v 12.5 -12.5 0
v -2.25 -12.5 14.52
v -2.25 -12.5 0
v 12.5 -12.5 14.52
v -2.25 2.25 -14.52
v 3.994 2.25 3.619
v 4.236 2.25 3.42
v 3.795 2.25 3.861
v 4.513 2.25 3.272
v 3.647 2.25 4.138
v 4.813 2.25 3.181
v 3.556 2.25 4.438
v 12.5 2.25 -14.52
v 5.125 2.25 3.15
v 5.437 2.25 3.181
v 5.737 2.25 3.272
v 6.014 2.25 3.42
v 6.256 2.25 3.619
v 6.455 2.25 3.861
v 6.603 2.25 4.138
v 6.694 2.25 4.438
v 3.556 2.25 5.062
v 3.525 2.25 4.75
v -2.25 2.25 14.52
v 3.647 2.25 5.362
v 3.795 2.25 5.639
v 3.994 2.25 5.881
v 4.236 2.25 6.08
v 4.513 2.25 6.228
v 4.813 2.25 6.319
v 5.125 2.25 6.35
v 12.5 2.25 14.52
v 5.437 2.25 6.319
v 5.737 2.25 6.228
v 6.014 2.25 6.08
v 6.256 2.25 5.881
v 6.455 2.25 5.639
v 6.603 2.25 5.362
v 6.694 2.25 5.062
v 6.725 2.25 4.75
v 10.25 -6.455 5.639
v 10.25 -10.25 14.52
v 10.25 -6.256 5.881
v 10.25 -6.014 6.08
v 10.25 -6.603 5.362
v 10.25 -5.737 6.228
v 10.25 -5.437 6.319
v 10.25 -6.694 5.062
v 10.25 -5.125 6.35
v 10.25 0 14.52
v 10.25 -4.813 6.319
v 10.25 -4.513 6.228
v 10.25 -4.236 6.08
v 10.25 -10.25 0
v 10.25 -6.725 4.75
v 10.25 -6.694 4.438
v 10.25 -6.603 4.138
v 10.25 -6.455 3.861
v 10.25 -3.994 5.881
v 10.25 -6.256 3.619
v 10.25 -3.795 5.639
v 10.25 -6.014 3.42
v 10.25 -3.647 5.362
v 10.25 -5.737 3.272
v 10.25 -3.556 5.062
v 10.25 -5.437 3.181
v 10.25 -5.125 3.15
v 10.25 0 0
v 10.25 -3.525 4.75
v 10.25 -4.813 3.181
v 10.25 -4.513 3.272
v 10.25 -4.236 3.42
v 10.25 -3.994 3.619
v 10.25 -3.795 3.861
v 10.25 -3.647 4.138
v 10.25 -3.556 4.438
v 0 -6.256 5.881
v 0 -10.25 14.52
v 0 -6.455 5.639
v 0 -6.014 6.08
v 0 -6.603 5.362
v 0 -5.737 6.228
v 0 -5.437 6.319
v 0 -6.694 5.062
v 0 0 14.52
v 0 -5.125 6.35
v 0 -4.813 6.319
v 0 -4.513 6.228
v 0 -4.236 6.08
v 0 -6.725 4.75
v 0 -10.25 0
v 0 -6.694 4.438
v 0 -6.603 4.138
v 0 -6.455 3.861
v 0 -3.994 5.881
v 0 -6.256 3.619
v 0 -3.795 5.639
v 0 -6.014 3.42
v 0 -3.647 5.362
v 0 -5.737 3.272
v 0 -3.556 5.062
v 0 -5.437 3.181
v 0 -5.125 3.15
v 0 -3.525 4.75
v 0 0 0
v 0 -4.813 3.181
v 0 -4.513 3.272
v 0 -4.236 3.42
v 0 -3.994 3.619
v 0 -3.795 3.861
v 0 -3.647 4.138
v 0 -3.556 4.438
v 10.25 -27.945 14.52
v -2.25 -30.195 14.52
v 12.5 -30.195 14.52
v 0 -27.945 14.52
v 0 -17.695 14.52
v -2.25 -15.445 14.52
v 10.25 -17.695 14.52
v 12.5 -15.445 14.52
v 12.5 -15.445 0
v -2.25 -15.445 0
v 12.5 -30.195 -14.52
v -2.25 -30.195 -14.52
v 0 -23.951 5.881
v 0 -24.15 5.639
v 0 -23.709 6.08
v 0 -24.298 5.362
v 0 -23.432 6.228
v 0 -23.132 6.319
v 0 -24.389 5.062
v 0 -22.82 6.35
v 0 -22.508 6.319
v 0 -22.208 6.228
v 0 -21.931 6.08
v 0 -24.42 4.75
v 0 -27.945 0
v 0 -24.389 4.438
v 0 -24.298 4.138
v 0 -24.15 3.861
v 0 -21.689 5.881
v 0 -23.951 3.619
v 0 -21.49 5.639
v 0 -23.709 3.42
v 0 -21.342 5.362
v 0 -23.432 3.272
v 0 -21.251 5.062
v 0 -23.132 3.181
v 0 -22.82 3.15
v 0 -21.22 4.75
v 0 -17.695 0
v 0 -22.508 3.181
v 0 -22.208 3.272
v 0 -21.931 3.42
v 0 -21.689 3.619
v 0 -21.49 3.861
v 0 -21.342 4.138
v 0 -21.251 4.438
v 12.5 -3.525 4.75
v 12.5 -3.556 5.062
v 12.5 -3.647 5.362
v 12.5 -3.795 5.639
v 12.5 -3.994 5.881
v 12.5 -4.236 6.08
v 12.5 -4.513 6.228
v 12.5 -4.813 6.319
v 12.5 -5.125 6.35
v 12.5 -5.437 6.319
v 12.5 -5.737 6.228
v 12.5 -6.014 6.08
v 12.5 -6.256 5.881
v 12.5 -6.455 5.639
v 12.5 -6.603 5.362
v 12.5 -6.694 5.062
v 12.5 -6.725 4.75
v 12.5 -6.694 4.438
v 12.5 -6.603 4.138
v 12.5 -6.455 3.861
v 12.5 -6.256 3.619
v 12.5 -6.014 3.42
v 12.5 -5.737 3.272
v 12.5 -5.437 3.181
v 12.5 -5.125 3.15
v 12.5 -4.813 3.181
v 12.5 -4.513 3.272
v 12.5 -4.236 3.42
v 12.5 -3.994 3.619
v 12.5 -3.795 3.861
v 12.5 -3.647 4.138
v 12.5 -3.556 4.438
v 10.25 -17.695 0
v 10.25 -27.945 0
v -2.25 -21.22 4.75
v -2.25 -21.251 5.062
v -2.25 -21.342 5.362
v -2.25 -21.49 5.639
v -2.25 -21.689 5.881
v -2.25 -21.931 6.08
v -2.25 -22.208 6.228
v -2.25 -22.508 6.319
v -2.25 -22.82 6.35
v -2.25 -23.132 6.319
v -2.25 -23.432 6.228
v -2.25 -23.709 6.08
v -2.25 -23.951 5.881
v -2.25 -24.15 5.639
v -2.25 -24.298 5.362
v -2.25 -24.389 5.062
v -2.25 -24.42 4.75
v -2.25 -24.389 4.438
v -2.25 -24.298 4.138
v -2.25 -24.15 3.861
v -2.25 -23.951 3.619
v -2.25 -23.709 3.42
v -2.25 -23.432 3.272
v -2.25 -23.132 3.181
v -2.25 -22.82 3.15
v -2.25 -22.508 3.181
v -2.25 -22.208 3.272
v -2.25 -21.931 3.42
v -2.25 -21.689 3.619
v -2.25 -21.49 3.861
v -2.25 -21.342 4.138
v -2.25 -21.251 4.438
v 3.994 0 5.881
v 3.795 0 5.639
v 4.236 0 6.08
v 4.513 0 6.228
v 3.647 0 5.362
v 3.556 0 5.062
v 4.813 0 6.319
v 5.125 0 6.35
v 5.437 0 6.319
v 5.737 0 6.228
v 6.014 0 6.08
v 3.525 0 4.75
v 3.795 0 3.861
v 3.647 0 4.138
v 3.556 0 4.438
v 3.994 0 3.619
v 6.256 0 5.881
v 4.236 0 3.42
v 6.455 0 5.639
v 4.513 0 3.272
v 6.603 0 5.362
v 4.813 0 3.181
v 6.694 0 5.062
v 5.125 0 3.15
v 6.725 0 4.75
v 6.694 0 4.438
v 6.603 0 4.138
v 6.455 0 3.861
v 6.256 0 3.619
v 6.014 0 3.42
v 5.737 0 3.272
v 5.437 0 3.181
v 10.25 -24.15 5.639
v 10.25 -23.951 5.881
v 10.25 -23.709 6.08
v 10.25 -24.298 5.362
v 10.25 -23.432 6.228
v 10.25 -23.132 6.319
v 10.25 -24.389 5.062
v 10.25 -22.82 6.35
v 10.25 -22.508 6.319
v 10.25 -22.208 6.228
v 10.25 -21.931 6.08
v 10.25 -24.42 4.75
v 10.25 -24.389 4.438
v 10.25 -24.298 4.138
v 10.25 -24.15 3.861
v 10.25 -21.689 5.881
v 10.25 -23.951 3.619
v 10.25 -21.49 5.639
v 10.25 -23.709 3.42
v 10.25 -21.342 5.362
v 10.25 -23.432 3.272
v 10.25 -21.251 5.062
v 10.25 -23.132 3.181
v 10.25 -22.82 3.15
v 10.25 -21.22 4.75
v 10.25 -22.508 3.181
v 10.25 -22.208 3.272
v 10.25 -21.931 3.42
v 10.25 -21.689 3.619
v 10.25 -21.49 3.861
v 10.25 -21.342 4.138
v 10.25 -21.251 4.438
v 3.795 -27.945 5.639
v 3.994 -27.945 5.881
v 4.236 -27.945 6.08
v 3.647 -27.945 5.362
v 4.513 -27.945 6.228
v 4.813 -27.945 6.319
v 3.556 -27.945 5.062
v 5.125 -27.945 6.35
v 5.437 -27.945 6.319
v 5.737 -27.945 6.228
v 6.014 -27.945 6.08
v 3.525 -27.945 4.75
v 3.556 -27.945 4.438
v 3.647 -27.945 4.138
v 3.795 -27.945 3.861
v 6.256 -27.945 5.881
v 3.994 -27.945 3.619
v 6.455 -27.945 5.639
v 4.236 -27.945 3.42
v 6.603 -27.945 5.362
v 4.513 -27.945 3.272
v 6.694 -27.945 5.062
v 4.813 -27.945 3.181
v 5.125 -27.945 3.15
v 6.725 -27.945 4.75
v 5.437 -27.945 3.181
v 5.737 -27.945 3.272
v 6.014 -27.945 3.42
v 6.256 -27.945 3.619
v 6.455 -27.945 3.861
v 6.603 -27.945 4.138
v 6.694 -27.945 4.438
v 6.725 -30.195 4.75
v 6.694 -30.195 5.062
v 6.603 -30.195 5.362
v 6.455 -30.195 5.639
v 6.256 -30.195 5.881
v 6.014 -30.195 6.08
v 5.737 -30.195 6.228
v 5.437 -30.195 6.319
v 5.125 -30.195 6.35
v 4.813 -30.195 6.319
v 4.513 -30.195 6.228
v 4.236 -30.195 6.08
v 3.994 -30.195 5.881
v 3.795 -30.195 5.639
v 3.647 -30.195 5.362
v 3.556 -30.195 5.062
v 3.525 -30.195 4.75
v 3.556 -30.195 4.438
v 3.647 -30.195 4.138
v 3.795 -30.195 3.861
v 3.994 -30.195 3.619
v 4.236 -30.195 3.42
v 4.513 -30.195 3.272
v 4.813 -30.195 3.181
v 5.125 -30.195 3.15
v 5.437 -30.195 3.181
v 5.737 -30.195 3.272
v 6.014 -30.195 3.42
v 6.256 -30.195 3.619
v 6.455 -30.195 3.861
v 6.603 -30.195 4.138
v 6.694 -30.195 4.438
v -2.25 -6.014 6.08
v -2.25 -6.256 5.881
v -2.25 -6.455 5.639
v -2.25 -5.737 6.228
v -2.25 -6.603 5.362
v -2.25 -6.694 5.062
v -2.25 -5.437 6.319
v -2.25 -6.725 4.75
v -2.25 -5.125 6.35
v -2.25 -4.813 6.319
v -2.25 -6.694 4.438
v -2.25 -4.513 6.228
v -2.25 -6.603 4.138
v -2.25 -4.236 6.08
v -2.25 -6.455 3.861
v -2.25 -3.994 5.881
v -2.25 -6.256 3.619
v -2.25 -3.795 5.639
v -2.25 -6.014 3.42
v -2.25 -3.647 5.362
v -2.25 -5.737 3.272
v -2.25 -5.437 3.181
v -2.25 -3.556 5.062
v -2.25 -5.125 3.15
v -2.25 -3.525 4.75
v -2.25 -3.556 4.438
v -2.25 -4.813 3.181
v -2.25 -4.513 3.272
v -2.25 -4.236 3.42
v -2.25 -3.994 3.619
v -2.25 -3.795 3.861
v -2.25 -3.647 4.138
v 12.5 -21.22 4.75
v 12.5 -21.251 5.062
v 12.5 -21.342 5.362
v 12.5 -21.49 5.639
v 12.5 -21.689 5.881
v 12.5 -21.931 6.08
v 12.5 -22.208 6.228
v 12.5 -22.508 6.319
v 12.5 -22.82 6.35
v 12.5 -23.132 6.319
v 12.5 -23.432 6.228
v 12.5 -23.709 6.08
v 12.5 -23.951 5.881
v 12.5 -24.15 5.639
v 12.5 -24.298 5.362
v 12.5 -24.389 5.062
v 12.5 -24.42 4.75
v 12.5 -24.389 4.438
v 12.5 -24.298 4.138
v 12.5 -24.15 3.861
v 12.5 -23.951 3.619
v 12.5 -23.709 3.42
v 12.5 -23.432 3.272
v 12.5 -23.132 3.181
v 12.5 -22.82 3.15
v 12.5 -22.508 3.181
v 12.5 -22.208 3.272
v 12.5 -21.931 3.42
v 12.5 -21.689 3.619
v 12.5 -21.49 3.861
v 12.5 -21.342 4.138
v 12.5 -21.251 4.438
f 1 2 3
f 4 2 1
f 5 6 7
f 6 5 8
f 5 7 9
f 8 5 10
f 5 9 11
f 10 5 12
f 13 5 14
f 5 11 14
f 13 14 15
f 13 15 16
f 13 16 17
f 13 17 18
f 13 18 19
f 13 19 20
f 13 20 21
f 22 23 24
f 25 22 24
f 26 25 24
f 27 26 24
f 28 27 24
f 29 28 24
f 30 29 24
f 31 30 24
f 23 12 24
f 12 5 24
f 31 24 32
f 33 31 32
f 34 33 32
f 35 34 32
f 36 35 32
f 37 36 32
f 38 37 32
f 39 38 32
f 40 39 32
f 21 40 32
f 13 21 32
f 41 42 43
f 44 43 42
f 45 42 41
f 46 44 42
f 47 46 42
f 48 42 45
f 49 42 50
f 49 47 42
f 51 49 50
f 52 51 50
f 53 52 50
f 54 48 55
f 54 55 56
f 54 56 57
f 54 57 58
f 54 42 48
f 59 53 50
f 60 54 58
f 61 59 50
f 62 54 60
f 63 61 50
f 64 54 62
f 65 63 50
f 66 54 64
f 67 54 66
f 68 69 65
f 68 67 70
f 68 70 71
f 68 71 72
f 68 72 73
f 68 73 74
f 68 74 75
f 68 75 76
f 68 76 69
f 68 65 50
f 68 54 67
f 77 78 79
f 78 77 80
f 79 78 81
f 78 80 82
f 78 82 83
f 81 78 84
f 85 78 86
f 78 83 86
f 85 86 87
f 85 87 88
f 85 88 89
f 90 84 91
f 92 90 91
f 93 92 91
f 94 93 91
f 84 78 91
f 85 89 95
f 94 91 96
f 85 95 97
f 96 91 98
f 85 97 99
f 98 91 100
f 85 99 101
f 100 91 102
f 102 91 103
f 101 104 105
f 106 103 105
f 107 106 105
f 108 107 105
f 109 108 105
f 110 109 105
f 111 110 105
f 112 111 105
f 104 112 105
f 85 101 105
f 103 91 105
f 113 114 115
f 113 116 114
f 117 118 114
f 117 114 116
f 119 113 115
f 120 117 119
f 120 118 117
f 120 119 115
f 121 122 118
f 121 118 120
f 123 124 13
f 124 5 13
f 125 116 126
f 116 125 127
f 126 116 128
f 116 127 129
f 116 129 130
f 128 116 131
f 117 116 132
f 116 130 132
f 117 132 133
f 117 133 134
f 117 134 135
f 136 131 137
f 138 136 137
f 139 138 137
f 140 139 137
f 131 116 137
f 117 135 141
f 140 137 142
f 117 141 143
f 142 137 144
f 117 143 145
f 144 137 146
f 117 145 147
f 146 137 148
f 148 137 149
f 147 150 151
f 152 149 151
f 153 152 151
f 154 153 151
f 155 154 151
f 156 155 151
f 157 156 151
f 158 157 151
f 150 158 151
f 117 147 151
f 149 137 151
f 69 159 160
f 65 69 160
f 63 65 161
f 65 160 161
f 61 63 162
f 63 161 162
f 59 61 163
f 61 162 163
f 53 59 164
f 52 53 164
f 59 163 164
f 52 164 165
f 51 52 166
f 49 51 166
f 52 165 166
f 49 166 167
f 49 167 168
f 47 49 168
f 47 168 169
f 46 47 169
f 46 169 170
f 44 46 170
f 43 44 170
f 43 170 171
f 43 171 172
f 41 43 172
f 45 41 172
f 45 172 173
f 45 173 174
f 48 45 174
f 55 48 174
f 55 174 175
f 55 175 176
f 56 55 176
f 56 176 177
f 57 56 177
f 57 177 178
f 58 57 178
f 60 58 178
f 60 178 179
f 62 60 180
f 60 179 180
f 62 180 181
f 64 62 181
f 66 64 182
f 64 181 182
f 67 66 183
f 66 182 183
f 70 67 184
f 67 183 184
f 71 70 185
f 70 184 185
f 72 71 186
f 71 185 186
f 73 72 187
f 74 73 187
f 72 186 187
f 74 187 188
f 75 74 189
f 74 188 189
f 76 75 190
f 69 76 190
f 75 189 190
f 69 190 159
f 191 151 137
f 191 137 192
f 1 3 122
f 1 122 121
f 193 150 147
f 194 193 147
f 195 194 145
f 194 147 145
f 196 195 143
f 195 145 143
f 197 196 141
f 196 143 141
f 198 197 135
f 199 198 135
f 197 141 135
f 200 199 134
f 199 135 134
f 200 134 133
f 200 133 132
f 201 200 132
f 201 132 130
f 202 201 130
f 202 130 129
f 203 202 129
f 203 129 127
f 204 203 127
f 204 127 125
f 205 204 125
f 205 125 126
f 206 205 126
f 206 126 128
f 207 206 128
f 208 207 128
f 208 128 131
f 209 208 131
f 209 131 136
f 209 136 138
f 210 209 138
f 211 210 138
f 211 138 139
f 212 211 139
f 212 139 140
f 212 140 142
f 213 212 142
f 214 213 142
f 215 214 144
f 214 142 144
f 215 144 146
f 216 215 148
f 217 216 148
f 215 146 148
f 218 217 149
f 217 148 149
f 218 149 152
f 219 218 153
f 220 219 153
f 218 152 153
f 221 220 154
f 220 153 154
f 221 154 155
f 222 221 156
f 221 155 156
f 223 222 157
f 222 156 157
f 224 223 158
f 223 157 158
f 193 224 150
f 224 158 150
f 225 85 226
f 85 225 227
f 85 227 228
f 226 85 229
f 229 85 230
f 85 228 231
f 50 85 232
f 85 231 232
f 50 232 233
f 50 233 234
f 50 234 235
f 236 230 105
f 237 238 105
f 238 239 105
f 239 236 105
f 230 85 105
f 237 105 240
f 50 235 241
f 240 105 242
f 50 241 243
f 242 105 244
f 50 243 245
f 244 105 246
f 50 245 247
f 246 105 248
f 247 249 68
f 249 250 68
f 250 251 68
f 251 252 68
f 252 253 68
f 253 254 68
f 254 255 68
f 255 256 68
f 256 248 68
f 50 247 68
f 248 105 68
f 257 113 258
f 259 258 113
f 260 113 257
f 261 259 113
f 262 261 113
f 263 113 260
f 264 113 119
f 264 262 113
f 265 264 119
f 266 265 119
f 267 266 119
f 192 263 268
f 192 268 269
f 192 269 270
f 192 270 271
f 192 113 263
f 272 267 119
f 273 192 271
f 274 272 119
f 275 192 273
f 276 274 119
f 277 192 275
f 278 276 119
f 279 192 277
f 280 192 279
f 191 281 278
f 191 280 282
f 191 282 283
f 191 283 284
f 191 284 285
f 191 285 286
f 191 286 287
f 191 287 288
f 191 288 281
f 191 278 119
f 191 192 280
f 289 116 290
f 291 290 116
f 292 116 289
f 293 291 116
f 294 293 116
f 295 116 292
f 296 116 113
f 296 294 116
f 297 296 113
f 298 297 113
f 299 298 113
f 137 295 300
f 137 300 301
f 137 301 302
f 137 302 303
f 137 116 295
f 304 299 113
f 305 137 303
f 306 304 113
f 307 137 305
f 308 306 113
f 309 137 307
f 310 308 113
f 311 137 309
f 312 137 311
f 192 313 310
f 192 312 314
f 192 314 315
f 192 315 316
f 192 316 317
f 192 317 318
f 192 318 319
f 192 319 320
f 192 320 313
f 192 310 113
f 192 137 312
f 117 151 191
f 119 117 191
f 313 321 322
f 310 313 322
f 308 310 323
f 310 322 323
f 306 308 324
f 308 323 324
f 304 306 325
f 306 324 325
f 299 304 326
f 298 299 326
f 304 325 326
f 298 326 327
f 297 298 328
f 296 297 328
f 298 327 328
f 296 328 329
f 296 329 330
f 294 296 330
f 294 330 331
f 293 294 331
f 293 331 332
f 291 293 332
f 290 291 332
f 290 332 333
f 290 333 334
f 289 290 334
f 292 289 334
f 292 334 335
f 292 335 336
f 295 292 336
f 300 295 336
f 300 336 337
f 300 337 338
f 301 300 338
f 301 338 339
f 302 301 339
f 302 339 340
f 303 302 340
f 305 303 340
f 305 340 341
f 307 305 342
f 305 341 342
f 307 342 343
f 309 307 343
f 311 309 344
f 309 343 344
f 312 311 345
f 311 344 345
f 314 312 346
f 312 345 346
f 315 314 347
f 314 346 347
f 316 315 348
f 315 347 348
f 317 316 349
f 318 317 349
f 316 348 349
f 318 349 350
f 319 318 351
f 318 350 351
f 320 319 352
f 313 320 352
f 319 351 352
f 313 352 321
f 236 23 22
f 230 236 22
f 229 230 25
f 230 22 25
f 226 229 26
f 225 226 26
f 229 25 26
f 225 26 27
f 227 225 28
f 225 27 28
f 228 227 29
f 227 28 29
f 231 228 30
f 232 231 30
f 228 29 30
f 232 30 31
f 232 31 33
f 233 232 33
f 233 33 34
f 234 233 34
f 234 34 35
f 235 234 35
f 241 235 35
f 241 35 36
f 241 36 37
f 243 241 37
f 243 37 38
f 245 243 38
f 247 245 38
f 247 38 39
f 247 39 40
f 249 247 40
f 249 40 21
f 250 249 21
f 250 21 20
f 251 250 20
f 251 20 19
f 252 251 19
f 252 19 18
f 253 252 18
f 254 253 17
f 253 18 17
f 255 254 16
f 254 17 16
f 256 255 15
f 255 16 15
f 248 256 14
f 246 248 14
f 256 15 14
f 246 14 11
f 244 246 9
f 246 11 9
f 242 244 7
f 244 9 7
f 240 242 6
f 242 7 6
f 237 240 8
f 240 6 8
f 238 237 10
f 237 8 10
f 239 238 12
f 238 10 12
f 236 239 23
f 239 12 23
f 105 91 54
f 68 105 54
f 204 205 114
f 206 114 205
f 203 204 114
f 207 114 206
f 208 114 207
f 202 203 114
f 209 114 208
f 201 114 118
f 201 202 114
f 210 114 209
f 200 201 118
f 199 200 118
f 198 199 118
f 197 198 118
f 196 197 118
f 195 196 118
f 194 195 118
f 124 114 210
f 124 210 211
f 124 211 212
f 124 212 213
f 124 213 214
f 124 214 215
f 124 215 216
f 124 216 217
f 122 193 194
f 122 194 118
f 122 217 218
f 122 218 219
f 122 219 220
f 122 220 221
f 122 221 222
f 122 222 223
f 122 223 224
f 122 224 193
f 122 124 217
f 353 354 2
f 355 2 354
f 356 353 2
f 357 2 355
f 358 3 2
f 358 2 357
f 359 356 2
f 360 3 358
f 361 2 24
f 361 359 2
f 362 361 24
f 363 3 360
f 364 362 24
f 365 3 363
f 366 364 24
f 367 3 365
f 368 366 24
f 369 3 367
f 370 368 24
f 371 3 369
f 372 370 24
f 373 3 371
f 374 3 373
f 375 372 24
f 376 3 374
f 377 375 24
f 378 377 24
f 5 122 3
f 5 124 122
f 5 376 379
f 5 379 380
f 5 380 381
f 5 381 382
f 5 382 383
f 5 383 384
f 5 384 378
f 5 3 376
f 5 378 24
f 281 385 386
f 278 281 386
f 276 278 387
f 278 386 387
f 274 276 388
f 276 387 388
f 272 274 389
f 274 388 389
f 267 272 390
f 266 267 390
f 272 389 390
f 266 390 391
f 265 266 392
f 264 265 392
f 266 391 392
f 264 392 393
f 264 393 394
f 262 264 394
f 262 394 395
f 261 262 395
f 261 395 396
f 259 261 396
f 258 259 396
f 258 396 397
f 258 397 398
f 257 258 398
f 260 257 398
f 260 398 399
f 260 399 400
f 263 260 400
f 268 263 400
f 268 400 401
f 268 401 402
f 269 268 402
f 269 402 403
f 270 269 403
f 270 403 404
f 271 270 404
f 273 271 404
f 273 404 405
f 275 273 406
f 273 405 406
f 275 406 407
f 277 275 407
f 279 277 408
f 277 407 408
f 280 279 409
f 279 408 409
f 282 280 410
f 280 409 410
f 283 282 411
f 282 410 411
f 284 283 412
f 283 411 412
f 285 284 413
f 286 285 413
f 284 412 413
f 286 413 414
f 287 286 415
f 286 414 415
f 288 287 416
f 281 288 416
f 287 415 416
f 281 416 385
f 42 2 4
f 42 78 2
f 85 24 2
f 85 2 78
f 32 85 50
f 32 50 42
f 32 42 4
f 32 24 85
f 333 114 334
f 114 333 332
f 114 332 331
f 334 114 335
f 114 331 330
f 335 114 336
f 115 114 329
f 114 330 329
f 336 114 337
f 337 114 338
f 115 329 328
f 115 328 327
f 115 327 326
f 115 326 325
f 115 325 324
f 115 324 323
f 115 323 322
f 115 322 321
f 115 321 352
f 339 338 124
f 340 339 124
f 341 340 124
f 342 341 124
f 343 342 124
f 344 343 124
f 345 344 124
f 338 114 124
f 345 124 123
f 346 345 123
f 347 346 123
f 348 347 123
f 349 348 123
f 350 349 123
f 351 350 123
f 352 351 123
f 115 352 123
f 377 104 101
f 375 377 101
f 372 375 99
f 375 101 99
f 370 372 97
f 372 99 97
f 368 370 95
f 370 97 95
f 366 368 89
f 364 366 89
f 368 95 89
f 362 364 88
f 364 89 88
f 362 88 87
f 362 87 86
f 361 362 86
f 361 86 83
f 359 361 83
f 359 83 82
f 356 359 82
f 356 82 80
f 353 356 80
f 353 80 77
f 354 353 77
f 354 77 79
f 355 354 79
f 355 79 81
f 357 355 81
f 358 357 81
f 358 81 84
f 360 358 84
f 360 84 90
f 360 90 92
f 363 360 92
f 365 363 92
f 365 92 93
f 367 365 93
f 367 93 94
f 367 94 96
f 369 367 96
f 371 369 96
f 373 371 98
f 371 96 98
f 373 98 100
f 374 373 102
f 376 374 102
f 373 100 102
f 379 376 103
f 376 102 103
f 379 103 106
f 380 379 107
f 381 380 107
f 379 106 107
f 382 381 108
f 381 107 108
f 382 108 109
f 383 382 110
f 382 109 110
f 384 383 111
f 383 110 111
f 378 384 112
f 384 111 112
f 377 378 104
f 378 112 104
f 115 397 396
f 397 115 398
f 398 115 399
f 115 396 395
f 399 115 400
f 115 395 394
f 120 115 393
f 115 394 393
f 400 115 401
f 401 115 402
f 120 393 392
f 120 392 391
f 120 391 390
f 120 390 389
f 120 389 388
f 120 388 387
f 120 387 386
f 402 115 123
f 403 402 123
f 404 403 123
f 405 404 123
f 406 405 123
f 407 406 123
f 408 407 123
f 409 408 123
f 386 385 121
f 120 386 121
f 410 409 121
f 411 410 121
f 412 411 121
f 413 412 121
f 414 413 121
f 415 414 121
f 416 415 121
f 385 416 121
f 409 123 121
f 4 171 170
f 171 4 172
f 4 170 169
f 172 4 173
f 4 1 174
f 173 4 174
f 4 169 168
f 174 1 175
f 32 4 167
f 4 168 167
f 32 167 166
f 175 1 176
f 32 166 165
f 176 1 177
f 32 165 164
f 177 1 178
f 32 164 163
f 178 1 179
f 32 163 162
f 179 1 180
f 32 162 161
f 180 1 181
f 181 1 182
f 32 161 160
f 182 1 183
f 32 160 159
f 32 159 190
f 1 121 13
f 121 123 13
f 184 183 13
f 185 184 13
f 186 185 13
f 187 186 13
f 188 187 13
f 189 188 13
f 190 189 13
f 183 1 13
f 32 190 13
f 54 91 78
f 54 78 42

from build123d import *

# Parameters (mm, degrees)
F0_W      = 14.75
F0_H      = 14.75
F0_W_2    = 10.25
F0_H_2    = 10.25
F1_DEPTH  = 14.5200116
F2_W      = 14.75
F2_H      = 14.75
F2_W_2    = 10.25
F2_H_2    = 10.25
F3_DEPTH  = 14.5200116
F5_W      = 14.75
F5_H      = 14.5200116
F4_W      = 14.75
F4_H      = 14.5200116
F6_DEPTH  = 17.695037
F7_W      = 14.75
F7_H      = 14.75
F7_W_2    = 10.25
F7_H_2    = 10.25
F8_DEPTH  = 14.5200116
F9_R      = 1.6
F10_DEPTH = 25.4
F11_R     = 1.6
F12_DEPTH = 10
F13_R     = 1.6
F14_DEPTH = 10


with BuildPart() as f1:
    # F0 (on Top) → F1 (new body)
    with BuildSketch(Plane.XY):
        with Locations((5.125, -5.125)):
            Rectangle(F0_W, F0_H)
        with Locations((5.125, -5.125)):
            Rectangle(F0_W_2, F0_H_2, mode=Mode.SUBTRACT)
    extrude(amount=F1_DEPTH)

    # F2 (on face) → F3 (join)
    with BuildSketch(Plane(origin=(0, 0, 0), x_dir=(1, 0, 0), z_dir=(0, 0, -1))):
        with Locations((5.125, 5.125)):
            Rectangle(F2_W, F2_H)
        with Locations((5.125, 5.125)):
            Rectangle(F2_W_2, F2_H_2, mode=Mode.SUBTRACT)
        with Locations((5.125, 5.125)):
            Rectangle(F2_W_2, F2_H_2)
    extrude(amount=F3_DEPTH)

    # F5 (on face) + F4 (on face) → F6 (join)
    with BuildSketch(Plane.XZ.offset(12.5)):
        with Locations((5.125, -7.2600058)):
            Rectangle(F5_W, F5_H)
    with BuildSketch(Plane.XZ.offset(12.5)):
        with Locations((5.125, -7.2600058)):
            Rectangle(F4_W, F4_H)
        Polygon((0, -12.2700116), (0, -2.25), (10.25, -2.25), (10.25, -12.2700116), (10.25, -12.5), (0, -12.5), align=None, mode=Mode.SUBTRACT)
        Polygon((10.25, -2.25), (0, -2.25), (0, -12.2700116), (0, -12.5), (10.25, -12.5), (10.25, -12.2700116), align=None)
    extrude(amount=F6_DEPTH)

    # F7 (on face) → F8 (join)
    with BuildSketch(Plane.XY):
        with Locations((5.125, -22.820037)):
            Rectangle(F7_W, F7_H)
        with Locations((5.125, -22.820037)):
            Rectangle(F7_W_2, F7_H_2, mode=Mode.SUBTRACT)
    extrude(amount=F8_DEPTH)

    # F9 (on face) → F10 (cut)
    with BuildSketch(Plane.YZ.offset(12.5)):
        with Locations((-22.820037, 4.75)):
            Circle(F9_R)
        with Locations((-5.125, 4.75)):
            Circle(F9_R)
    extrude(amount=-F10_DEPTH, mode=Mode.SUBTRACT)

    # F11 (on face) → F12 (cut)
    with BuildSketch(Plane.XZ.offset(30.195037)):
        with Locations((5.125, 4.75)):
            Circle(F11_R)
    extrude(amount=-F12_DEPTH, mode=Mode.SUBTRACT)

    # F13 (on face) → F14 (cut)
    with BuildSketch(Plane(origin=(0, 2.25, 0), x_dir=(-1, 0, 0), z_dir=(0, 1, 0))):
        with Locations((-5.125, 4.75)):
            Circle(F13_R)
    extrude(amount=-F14_DEPTH, mode=Mode.SUBTRACT)


solid = f1.part
